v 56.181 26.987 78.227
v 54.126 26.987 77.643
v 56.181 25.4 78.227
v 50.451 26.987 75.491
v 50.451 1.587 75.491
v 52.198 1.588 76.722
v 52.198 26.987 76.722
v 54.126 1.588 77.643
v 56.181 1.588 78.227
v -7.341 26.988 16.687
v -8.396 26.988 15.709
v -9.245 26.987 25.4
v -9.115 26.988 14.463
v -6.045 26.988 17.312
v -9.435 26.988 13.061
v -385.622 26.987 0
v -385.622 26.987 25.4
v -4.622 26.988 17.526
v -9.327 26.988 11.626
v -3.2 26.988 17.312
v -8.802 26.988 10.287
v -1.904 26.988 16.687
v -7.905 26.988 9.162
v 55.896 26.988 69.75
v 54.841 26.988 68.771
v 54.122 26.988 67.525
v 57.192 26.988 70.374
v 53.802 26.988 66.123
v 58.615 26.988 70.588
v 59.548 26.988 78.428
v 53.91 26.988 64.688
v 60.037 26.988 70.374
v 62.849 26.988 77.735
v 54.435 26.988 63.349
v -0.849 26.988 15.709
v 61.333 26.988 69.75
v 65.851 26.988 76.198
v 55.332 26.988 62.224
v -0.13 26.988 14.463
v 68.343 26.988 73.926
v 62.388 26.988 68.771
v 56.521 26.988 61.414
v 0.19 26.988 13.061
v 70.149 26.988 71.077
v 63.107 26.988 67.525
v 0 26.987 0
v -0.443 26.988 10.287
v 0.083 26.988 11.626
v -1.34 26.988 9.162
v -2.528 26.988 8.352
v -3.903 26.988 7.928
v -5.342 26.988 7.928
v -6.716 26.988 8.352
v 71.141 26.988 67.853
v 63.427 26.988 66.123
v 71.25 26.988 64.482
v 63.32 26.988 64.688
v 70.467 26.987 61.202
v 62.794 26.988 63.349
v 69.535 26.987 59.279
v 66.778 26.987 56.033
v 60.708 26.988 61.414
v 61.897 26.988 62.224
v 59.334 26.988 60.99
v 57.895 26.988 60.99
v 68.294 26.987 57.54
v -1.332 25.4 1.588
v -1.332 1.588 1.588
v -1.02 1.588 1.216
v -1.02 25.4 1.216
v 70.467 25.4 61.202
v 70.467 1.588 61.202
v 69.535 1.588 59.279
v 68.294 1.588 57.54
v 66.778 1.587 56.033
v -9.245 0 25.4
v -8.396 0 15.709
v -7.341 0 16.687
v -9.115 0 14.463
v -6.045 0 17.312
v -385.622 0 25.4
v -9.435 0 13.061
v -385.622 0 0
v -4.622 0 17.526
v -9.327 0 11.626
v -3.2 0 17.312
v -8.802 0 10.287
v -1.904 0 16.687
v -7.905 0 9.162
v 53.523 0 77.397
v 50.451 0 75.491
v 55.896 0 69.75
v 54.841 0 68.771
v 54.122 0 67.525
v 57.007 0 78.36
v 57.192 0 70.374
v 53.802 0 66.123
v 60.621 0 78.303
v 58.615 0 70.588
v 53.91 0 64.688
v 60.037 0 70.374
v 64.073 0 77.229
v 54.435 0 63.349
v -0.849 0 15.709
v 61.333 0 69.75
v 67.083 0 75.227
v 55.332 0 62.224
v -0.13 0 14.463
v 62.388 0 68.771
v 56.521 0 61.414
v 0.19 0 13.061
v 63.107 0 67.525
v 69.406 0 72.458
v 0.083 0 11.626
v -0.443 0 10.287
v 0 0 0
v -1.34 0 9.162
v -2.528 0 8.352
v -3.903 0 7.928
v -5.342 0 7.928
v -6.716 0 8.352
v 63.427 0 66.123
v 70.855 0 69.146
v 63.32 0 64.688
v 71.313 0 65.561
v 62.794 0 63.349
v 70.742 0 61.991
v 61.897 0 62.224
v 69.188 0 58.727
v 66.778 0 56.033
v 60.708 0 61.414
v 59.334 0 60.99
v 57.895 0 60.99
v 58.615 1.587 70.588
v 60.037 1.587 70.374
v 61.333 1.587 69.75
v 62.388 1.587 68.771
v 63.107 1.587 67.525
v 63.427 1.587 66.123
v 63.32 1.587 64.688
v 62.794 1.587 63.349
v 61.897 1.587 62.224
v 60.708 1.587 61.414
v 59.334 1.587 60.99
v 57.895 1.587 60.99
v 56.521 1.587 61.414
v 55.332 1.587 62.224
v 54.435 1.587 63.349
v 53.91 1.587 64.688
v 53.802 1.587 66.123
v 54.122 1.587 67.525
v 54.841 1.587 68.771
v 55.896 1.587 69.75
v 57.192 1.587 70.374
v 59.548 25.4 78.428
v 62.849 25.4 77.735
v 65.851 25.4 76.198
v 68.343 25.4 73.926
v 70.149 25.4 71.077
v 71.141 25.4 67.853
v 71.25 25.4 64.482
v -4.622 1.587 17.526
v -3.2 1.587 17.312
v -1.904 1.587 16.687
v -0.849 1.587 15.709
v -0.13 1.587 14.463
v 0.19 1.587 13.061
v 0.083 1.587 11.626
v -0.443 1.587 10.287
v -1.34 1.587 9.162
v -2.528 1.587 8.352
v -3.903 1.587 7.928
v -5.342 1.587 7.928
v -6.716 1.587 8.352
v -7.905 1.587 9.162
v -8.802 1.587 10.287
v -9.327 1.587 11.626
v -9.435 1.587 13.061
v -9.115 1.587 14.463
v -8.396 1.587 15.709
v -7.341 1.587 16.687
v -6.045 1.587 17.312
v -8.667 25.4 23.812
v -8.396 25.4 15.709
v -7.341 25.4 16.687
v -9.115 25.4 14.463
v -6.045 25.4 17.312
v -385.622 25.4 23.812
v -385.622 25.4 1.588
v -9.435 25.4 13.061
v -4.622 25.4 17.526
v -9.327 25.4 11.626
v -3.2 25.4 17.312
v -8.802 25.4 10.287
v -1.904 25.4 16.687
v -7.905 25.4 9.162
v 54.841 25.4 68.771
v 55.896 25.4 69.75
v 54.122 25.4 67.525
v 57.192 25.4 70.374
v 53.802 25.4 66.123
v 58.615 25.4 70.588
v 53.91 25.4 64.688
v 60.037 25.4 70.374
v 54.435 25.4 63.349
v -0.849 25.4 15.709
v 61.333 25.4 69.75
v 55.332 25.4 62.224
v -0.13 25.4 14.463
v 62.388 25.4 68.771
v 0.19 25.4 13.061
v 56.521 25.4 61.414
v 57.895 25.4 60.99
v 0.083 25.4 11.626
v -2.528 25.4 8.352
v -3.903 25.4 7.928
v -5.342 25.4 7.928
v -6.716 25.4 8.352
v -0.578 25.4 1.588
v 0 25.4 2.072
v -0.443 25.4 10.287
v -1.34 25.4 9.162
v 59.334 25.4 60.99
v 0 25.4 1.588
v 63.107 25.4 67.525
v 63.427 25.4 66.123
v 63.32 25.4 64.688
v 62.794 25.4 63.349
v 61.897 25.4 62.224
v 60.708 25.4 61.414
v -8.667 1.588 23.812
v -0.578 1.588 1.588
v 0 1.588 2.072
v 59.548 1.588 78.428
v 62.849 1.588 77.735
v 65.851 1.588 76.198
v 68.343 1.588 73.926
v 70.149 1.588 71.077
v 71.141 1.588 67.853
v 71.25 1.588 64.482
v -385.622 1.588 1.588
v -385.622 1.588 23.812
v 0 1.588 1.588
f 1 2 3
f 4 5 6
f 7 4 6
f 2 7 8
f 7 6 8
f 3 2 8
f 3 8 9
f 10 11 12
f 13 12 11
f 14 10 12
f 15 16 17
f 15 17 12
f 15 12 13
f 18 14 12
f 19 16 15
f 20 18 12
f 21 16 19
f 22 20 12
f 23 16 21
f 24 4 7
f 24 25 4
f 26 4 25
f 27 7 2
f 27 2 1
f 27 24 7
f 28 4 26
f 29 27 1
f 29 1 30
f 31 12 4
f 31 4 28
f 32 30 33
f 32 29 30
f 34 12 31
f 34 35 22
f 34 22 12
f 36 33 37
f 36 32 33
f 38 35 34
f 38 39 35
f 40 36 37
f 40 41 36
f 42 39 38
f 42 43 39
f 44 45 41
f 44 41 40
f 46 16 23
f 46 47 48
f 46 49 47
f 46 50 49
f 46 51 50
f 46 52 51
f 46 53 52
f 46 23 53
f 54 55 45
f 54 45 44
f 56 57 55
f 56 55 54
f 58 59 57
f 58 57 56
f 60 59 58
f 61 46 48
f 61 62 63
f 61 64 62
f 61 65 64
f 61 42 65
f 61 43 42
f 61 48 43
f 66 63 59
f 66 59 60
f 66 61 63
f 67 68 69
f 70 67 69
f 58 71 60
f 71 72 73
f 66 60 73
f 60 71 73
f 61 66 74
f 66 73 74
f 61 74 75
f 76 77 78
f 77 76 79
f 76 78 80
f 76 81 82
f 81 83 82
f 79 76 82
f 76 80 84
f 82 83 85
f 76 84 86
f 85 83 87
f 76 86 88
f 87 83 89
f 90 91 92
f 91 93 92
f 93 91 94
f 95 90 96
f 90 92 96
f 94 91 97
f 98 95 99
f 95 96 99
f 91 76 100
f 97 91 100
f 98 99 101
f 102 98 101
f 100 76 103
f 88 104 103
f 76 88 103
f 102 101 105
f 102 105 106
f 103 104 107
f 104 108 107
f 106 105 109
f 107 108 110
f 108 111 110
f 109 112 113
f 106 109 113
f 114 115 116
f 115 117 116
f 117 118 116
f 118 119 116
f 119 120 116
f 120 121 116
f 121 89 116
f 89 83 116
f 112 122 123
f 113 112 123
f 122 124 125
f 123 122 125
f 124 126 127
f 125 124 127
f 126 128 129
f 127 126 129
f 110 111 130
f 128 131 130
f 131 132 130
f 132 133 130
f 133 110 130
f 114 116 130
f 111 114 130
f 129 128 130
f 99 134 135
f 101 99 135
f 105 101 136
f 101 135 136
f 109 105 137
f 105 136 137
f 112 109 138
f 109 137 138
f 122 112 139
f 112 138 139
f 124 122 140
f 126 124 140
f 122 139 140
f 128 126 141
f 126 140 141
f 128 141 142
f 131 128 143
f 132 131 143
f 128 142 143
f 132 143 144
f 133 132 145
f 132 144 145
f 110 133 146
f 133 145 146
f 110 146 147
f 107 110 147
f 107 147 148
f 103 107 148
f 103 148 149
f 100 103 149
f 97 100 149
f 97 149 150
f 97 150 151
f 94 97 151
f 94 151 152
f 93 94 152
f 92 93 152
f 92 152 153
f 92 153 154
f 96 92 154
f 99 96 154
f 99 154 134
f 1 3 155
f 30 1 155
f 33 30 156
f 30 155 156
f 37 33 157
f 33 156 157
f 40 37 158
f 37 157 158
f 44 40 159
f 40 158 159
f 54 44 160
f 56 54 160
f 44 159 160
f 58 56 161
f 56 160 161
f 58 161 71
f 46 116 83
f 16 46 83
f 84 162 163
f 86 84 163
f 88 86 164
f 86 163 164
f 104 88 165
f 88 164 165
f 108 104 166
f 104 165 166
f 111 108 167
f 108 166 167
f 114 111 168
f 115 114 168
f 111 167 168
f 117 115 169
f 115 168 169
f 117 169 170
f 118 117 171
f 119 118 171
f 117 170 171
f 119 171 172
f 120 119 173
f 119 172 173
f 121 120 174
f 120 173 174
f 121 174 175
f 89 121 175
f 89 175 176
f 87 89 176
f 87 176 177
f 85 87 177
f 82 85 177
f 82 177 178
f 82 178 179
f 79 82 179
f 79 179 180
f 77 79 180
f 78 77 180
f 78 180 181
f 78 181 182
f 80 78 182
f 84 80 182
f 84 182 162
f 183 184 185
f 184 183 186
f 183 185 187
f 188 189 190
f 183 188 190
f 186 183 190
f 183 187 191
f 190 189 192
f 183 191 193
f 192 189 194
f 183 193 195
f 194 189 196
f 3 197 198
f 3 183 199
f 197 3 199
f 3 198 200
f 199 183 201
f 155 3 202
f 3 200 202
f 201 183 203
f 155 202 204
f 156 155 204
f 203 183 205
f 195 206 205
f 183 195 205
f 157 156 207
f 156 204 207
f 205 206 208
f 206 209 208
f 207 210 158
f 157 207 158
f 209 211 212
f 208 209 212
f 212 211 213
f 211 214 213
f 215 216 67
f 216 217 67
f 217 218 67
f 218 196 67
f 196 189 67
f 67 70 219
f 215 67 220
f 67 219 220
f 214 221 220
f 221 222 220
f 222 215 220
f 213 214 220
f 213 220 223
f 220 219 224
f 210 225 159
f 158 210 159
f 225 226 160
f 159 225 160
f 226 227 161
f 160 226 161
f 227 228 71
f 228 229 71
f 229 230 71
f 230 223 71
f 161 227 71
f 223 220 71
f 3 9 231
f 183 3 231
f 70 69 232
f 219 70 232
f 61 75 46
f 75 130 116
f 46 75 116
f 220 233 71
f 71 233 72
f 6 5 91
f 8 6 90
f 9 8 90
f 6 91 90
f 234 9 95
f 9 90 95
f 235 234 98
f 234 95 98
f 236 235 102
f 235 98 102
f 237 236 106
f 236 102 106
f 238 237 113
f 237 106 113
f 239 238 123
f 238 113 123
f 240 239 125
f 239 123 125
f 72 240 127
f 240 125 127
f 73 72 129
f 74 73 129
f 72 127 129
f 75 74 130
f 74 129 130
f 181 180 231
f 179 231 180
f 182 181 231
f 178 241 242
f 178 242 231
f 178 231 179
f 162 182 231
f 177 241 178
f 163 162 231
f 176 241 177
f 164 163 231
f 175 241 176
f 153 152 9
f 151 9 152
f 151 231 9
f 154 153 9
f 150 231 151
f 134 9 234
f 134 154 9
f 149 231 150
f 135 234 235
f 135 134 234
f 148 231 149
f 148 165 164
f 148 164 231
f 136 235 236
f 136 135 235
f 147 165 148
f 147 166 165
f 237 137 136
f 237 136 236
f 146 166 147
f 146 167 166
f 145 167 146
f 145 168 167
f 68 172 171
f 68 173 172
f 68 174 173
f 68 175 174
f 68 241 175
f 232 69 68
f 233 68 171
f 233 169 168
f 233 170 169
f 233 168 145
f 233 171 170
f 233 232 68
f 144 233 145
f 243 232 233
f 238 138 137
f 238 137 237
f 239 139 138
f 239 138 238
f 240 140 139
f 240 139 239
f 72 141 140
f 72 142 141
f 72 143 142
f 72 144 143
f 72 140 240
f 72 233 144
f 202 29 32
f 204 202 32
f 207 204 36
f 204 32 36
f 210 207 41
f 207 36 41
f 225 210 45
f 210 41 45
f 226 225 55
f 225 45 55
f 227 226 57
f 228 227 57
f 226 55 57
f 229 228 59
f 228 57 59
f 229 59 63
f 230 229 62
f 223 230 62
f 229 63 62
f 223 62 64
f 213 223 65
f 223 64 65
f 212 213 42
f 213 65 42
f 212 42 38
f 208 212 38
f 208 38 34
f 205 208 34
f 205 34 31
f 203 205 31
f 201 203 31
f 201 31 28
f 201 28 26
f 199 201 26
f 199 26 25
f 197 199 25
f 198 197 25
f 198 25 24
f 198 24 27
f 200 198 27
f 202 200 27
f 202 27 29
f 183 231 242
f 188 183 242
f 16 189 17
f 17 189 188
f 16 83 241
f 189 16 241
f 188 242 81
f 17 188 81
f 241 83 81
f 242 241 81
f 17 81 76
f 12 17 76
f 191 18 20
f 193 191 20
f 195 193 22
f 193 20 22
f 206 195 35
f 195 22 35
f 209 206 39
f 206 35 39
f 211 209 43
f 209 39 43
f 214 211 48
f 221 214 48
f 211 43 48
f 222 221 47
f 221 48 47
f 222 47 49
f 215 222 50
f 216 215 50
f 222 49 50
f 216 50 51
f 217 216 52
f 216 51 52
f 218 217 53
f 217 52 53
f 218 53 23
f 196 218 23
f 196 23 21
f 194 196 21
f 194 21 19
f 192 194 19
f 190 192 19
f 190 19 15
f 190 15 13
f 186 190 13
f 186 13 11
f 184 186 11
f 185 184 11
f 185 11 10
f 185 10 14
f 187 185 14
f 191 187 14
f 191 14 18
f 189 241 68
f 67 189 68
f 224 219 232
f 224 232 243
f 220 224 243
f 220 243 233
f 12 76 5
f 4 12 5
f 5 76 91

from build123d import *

# Parameters (mm, degrees)
BOSS_EXTRUDE1_DEPTH = 1.5875
BOSS_EXTRUDE2_DEPTH = 25.4
BOSS_EXTRUDE3_START = -1.5875
BOSS_EXTRUDE3_DEPTH = 1.5875
SKETCH4_R           = 4.826
CUT_EXTRUDE1_DEPTH  = 55.9435


with BuildPart() as part:
    # Sketch1 → Boss-Extrude1 (new body)
    with BuildSketch(Plane(origin=(0, 0, 0), x_dir=(1, 0, 0), z_dir=(0, 1, 0))):
        with BuildLine():
            Line((-385.622421975, -25.4), (-9.24484395, -25.4))
            Line((-9.24484395, -25.4), (50.451144161, -75.490881607))
            ThreePointArc((50.451144161, -75.490881607), (68.343311232, -73.925519823), (66.777949447, -56.033352752))
            Line((66.777949447, -56.033352752), (0, 0))
            Line((0, 0), (-385.622421975, 0))
            Line((-385.622421975, 0), (-385.622421975, -25.4))
        make_face()
    extrude(amount=BOSS_EXTRUDE1_DEPTH)

    # Sketch2 → Boss-Extrude2 (add)
    with BuildSketch(Plane(origin=(0, 1.5875, 0), x_dir=(1, 0, 0), z_dir=(0, 1, 0))):
        with BuildLine():
            Line((-385.622421975, 0), (-385.622421975, -1.5875))
            Line((-385.622421975, -1.5875), (-1.332070664, -1.5875))
            Line((-1.332070664, -1.5875), (-1.02042533, -1.216095553))
            Line((-1.02042533, -1.216095553), (-0.577802747, -1.5875))
            Line((-0.577802747, -1.5875), (0, -1.5875))
            Line((0, -1.5875), (0, -2.072334072))
            Line((0, -2.072334072), (70.467441943, -61.201538616))
            ThreePointArc((70.467441943, -61.201538616), (68.950918532, -58.383132189), (66.777949447, -56.033352752))
            Line((66.777949447, -56.033352752), (0, 0))
            Line((0, 0), (-385.622421975, 0))
        make_face()
        with BuildLine():
            Line((-8.667041203, -23.8125), (-385.622421975, -23.8125))
            Line((-385.622421975, -23.8125), (-385.622421975, -25.4))
            Line((-385.622421975, -25.4), (-9.24484395, -25.4))
            Line((-9.24484395, -25.4), (50.451144161, -75.490881607))
            ThreePointArc((50.451144161, -75.490881607), (53.14255729, -77.222803492), (56.181487318, -78.226876364))
            Line((56.181487318, -78.226876364), (-8.667041203, -23.8125))
        make_face()
    extrude(amount=BOSS_EXTRUDE2_DEPTH)

    # Sketch3 → Boss-Extrude3 (add)
    with BuildSketch(Plane(origin=(0, 26.9875, 0), x_dir=(1, 0, 0), z_dir=(0, 1, 0)).offset(BOSS_EXTRUDE3_START)):
        with BuildLine():
            Line((-385.622421975, 0), (-385.622421975, -25.4))
            Line((-385.622421975, -25.4), (-9.24484395, -25.4))
            Line((-9.24484395, -25.4), (50.451144161, -75.490881607))
            ThreePointArc((50.451144161, -75.490881607), (68.343311232, -73.925519823), (66.777949447, -56.033352752))
            Line((66.777949447, -56.033352752), (0, 0))
            Line((0, 0), (-385.622421975, 0))
        make_face()
    extrude(amount=BOSS_EXTRUDE3_DEPTH)

    # Sketch4 → Cut-Extrude1 (cut)
    with BuildSketch(Plane(origin=(0, 26.9875, 0), x_dir=(1, 0, 0), z_dir=(0, 1, 0))):
        with Locations(Location((58.614546804, -65.76211718, 0), (0, 0, 270))):
            Circle(SKETCH4_R)
        with Locations(Location((-4.622421975, -12.7, 0), (0, 0, 270))):
            Circle(SKETCH4_R)
    extrude(amount=-CUT_EXTRUDE1_DEPTH, mode=Mode.SUBTRACT)


solid = part.part
